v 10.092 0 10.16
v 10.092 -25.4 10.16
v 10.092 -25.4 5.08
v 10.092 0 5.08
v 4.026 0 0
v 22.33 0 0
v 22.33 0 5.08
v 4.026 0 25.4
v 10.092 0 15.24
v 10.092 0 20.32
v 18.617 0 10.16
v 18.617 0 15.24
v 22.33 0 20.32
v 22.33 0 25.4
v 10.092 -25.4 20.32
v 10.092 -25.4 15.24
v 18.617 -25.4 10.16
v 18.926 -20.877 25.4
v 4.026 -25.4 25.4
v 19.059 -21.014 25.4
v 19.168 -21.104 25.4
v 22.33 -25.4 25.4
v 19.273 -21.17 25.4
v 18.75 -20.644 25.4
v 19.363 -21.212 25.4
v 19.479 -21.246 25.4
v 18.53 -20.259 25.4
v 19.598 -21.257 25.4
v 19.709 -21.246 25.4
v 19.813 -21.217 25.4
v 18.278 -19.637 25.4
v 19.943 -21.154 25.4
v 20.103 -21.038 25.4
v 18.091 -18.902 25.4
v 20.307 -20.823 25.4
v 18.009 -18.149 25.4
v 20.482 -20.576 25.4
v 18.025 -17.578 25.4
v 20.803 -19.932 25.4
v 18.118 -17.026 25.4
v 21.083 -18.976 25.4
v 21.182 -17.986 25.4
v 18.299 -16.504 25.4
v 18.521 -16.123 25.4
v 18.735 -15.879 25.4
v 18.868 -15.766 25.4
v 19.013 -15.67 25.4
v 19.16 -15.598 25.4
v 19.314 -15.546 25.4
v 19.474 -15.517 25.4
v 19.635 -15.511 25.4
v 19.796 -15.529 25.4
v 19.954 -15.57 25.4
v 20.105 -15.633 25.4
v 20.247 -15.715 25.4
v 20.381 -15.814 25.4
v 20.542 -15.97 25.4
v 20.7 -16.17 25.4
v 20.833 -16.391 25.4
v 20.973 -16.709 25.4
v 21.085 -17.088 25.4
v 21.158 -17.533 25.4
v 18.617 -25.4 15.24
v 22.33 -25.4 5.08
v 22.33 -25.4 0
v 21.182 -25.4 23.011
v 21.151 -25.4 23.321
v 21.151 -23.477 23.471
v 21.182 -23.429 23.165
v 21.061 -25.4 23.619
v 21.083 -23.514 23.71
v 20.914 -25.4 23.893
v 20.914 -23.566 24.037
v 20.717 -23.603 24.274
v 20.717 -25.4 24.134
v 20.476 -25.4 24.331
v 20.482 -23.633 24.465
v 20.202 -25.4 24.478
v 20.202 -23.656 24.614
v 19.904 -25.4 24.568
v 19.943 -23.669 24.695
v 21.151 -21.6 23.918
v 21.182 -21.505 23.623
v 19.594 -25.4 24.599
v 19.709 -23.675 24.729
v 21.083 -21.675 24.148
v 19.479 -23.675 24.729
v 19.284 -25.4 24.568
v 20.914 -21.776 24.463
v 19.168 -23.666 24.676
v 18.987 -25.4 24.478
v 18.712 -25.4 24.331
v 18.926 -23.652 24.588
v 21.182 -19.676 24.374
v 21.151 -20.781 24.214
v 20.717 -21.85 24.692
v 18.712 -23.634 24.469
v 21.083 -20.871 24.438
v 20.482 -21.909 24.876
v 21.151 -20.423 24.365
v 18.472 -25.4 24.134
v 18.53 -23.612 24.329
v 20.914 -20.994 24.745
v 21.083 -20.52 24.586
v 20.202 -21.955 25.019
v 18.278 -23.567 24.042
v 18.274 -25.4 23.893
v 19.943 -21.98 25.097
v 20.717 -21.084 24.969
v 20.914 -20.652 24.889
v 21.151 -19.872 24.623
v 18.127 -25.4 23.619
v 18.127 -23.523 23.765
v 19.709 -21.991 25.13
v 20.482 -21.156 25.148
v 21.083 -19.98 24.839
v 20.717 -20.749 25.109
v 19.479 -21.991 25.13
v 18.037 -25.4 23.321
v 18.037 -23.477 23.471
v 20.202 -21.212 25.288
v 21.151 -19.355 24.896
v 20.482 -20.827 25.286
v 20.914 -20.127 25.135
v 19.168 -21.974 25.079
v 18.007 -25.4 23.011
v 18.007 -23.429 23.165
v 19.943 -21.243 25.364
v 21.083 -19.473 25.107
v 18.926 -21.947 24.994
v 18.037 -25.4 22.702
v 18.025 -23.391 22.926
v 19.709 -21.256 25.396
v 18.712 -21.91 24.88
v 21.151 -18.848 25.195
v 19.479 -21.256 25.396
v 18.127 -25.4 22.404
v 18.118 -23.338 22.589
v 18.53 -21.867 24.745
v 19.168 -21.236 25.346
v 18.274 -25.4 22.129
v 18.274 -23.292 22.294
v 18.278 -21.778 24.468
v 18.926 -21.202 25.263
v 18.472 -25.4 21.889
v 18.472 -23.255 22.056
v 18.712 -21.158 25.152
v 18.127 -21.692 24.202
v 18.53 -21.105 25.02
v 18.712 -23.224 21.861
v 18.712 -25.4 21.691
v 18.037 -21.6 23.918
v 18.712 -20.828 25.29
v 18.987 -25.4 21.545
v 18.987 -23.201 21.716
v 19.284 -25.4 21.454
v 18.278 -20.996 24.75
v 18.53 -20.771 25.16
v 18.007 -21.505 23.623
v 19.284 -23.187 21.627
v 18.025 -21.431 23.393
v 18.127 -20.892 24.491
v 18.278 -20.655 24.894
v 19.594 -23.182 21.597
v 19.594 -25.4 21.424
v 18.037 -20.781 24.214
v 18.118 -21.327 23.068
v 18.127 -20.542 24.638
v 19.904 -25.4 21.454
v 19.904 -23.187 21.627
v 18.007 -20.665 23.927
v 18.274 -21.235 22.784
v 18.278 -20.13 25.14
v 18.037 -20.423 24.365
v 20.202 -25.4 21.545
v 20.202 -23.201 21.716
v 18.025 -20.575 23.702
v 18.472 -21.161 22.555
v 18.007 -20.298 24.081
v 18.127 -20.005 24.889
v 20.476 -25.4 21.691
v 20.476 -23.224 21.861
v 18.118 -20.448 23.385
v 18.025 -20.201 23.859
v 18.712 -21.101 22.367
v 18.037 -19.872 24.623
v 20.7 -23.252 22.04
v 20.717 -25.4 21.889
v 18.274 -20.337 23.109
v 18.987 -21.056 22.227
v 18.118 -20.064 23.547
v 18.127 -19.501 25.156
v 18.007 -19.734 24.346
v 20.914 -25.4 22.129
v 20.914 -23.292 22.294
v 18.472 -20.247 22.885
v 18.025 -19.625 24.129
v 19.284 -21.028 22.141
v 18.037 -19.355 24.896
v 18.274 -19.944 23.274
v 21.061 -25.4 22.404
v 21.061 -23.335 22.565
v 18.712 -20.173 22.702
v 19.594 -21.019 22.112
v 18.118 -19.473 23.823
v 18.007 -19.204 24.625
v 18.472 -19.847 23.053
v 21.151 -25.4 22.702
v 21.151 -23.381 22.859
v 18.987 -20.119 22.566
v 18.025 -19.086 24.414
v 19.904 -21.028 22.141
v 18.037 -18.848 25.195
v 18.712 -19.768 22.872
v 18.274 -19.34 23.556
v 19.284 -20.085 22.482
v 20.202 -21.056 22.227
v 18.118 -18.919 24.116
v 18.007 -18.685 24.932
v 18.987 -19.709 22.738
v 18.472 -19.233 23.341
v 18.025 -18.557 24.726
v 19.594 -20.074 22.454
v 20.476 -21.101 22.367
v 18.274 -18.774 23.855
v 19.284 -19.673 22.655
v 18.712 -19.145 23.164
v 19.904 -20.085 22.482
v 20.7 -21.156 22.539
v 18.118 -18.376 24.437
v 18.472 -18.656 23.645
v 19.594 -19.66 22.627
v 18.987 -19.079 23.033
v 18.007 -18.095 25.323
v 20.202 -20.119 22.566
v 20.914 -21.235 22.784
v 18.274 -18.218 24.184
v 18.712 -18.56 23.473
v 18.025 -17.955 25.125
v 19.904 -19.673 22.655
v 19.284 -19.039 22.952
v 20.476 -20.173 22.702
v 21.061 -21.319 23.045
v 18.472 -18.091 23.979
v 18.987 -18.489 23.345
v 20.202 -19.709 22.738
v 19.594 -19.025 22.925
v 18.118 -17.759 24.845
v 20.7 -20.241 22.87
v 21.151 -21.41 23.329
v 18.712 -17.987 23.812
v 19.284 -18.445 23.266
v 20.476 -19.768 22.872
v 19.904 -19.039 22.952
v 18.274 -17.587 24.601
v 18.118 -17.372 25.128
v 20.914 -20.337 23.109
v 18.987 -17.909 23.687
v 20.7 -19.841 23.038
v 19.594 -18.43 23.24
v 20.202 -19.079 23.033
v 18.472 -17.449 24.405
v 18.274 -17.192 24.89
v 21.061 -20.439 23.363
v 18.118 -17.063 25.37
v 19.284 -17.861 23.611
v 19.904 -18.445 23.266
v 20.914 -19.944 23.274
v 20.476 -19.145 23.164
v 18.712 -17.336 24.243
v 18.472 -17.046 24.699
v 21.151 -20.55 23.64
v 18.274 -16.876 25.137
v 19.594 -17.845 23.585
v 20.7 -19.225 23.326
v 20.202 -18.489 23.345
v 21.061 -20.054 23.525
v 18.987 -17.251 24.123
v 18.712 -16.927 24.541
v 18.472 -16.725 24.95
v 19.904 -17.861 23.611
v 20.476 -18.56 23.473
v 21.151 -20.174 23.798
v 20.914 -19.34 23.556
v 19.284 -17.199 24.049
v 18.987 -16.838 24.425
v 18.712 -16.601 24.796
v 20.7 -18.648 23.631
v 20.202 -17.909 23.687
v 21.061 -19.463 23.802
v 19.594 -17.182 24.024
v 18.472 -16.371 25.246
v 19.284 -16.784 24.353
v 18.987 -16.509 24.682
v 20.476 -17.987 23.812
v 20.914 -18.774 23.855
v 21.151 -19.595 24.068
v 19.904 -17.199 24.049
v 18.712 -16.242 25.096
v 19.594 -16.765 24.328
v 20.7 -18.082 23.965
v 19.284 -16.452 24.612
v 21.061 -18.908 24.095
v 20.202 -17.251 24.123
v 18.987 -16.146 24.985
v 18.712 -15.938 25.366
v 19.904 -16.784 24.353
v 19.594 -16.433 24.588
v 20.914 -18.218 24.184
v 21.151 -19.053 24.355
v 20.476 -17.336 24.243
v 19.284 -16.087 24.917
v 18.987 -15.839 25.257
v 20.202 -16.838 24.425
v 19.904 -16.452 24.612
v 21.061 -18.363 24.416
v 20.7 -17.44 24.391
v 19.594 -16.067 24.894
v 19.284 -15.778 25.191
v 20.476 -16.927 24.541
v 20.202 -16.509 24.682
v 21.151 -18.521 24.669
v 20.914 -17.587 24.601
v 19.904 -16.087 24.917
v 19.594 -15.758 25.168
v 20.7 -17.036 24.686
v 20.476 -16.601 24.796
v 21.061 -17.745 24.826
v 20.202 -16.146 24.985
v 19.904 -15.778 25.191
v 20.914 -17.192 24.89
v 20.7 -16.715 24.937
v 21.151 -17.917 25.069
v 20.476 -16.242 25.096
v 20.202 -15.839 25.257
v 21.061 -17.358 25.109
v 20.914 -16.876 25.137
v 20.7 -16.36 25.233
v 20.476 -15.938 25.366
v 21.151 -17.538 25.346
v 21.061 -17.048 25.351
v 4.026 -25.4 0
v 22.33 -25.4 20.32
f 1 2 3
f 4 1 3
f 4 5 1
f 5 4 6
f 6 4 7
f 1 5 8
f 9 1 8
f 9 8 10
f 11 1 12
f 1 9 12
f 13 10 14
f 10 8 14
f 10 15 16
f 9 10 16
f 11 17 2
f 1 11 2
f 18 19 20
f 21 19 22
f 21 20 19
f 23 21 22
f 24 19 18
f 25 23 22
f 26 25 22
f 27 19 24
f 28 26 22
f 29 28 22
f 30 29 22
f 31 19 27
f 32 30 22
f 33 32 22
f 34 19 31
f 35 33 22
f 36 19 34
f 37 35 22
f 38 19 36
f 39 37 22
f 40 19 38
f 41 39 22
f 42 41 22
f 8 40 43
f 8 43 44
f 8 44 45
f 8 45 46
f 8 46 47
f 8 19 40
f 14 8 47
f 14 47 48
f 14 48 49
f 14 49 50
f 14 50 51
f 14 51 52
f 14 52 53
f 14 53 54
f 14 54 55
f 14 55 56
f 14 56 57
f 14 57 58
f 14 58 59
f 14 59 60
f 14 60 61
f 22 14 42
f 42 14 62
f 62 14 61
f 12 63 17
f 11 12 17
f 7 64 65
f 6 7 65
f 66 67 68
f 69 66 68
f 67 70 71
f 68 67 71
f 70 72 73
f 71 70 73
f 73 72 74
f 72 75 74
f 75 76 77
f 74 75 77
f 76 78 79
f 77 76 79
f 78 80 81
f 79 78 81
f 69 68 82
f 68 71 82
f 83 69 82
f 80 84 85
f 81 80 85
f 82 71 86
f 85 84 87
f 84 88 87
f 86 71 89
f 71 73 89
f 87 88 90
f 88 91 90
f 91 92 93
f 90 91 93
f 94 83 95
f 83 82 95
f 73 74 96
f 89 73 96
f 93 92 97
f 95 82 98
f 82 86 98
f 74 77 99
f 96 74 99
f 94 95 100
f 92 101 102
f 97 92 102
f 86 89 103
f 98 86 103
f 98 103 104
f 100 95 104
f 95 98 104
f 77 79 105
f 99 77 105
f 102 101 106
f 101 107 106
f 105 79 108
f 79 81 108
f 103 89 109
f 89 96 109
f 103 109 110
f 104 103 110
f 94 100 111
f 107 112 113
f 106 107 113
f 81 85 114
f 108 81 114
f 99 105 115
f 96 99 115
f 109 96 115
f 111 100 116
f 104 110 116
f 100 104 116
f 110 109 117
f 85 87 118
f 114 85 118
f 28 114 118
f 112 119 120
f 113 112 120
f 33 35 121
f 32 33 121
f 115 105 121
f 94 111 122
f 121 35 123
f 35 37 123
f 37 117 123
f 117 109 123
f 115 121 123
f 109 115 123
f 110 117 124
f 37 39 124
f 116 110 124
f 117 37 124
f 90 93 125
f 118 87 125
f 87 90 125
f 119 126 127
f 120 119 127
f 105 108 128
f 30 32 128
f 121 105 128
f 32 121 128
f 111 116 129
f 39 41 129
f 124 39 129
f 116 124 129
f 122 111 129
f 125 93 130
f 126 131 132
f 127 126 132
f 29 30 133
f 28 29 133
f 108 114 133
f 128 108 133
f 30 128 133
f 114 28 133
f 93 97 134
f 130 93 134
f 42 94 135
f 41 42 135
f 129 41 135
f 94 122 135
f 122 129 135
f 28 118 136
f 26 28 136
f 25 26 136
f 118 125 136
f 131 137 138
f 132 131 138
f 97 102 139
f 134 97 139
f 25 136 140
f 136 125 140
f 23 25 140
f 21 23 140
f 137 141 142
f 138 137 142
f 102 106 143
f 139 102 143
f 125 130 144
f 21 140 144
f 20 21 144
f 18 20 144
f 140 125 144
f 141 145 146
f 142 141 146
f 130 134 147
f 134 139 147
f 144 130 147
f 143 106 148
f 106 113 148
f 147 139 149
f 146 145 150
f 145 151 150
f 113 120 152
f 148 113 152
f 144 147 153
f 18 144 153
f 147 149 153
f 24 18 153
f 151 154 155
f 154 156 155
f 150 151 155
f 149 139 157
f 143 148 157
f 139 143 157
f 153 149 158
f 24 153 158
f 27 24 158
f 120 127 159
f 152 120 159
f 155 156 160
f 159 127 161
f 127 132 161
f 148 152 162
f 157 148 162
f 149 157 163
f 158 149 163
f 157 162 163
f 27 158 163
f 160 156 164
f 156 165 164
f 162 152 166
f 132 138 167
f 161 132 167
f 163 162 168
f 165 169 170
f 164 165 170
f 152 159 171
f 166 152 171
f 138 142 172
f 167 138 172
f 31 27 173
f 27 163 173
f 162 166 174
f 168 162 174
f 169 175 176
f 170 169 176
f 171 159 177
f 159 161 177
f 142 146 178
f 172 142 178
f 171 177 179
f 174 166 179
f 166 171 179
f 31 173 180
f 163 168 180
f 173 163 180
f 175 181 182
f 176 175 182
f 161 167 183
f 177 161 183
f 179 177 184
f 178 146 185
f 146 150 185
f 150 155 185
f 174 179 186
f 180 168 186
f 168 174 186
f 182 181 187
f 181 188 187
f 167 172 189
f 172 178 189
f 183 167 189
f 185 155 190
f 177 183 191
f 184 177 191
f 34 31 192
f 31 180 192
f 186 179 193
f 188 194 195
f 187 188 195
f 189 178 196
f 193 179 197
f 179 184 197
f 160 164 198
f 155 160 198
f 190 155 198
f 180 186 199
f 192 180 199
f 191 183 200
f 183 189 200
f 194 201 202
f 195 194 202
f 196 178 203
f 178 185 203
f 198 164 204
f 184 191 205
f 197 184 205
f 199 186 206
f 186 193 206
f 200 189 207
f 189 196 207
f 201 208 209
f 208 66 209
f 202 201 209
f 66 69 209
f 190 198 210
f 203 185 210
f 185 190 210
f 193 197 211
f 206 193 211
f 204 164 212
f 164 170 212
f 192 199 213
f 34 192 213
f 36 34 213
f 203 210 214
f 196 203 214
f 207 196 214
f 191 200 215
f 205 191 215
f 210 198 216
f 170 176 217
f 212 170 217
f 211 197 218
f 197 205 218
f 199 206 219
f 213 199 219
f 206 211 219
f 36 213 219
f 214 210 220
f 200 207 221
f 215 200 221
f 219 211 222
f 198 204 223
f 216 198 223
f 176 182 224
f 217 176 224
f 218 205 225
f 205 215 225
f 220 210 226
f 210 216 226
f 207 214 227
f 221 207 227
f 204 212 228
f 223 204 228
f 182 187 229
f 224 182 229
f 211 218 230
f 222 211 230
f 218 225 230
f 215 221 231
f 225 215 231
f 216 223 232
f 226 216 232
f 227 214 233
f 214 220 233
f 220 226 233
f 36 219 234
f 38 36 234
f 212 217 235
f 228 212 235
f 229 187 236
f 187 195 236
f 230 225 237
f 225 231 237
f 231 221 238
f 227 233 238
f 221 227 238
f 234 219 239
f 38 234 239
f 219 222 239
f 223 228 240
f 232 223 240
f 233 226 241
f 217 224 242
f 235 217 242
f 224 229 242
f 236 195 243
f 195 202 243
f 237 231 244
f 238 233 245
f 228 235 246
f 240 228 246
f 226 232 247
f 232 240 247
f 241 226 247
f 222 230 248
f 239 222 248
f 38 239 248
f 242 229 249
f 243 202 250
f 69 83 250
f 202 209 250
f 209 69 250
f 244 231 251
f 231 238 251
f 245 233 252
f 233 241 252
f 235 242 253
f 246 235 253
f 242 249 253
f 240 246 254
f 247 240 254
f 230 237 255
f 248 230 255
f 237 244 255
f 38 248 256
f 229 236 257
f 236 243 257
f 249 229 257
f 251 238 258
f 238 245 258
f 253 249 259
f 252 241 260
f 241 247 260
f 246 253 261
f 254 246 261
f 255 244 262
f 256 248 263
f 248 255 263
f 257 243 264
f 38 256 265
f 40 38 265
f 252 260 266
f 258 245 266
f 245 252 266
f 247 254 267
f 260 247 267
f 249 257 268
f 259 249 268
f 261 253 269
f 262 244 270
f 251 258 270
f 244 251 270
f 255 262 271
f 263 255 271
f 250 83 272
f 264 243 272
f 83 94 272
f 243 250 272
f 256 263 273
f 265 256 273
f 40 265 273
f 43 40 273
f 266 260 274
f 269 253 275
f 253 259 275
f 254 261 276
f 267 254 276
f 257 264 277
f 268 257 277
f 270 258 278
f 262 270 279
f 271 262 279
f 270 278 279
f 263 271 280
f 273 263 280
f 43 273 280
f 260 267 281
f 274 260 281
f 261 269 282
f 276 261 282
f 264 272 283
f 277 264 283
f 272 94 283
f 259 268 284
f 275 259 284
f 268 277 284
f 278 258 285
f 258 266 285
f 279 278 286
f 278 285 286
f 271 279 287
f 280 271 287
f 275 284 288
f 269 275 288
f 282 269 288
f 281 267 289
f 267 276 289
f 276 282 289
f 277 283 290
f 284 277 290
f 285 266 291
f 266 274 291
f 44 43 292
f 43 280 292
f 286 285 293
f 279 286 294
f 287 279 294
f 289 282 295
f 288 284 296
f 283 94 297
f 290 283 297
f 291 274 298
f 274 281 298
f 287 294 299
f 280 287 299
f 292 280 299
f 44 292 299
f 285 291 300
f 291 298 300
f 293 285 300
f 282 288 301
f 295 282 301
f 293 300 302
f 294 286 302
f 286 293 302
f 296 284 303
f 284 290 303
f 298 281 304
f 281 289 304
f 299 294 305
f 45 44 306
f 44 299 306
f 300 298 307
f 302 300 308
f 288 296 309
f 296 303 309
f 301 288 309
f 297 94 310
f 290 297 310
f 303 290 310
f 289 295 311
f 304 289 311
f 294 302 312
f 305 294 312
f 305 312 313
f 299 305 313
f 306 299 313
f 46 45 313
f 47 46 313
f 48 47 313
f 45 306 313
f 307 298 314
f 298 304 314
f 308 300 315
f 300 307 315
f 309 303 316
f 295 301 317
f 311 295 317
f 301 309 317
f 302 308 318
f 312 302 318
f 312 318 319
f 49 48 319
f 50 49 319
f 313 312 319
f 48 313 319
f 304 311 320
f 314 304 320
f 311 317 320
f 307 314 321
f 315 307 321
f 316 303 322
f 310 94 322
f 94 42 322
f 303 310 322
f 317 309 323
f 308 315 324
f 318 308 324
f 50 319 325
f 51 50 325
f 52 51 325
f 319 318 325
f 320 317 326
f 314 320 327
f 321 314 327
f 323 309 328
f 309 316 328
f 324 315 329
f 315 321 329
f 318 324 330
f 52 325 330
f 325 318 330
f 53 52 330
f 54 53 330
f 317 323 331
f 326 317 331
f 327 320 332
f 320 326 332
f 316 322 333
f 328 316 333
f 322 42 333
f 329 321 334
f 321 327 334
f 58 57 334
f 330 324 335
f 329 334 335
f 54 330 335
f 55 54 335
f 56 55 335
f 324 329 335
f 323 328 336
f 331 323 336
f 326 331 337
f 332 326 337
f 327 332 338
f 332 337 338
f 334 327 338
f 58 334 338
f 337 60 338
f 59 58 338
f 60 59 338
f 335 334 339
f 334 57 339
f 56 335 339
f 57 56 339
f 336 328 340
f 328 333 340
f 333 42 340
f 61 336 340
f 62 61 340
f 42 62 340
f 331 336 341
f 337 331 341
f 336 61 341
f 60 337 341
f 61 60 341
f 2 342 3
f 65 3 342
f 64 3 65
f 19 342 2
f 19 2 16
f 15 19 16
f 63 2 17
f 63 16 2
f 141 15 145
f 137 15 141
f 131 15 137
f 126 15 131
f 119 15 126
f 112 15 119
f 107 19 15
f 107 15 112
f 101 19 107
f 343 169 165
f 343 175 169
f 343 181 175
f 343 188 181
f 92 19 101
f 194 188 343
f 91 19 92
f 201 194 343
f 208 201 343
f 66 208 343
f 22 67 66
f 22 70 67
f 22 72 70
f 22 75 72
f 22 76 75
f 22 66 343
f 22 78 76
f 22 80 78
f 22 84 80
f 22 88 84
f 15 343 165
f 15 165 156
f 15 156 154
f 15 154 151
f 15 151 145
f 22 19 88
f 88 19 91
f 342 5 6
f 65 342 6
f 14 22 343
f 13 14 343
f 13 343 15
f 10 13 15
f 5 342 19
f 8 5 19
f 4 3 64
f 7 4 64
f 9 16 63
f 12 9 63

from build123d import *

# Parameters (mm, degrees)
F0_W     = 25.4
F0_H     = 25.4
F1_DEPTH = 25.4
F2_W     = 4.02581
F2_H     = 25.4
F3_DEPTH = 25.4
F4_R     = 1.5875


with BuildPart() as f1:
    # F0 (on Front) → F1 (new body)
    with BuildSketch(Plane.XZ):
        with Locations((12.7, 12.7)):
            Rectangle(F0_W, F0_H)
    extrude(amount=F1_DEPTH)

    # F2 (on face) → F3 (cut)
    with BuildSketch(Plane.XZ.offset(25.4)):
        with Locations((2.012905, 12.7)):
            Rectangle(F2_W, F2_H)
        Polygon((25.4, 25.4), (22.33037, 25.4), (22.33037, 20.32), (10.092464, 20.32), (10.092464, 15.24), (18.617159, 15.24), (18.617159, 10.16), (10.092464, 10.16), (10.092464, 5.08), (22.33037, 5.08), (22.33037, 0), (25.4, 0), align=None)
    extrude(amount=-F3_DEPTH, mode=Mode.SUBTRACT)

    # F4 (on face) → F5 (revolve, cut)
    with BuildSketch(Plane.XZ.offset(25.4)):
        with Locations((19.594045, 23.011442)):
            Circle(F4_R)
    revolve(axis=Axis((19.811029, -25.4, 35.711442), (1, 0, 0)), mode=Mode.SUBTRACT)


solid = f1.part
